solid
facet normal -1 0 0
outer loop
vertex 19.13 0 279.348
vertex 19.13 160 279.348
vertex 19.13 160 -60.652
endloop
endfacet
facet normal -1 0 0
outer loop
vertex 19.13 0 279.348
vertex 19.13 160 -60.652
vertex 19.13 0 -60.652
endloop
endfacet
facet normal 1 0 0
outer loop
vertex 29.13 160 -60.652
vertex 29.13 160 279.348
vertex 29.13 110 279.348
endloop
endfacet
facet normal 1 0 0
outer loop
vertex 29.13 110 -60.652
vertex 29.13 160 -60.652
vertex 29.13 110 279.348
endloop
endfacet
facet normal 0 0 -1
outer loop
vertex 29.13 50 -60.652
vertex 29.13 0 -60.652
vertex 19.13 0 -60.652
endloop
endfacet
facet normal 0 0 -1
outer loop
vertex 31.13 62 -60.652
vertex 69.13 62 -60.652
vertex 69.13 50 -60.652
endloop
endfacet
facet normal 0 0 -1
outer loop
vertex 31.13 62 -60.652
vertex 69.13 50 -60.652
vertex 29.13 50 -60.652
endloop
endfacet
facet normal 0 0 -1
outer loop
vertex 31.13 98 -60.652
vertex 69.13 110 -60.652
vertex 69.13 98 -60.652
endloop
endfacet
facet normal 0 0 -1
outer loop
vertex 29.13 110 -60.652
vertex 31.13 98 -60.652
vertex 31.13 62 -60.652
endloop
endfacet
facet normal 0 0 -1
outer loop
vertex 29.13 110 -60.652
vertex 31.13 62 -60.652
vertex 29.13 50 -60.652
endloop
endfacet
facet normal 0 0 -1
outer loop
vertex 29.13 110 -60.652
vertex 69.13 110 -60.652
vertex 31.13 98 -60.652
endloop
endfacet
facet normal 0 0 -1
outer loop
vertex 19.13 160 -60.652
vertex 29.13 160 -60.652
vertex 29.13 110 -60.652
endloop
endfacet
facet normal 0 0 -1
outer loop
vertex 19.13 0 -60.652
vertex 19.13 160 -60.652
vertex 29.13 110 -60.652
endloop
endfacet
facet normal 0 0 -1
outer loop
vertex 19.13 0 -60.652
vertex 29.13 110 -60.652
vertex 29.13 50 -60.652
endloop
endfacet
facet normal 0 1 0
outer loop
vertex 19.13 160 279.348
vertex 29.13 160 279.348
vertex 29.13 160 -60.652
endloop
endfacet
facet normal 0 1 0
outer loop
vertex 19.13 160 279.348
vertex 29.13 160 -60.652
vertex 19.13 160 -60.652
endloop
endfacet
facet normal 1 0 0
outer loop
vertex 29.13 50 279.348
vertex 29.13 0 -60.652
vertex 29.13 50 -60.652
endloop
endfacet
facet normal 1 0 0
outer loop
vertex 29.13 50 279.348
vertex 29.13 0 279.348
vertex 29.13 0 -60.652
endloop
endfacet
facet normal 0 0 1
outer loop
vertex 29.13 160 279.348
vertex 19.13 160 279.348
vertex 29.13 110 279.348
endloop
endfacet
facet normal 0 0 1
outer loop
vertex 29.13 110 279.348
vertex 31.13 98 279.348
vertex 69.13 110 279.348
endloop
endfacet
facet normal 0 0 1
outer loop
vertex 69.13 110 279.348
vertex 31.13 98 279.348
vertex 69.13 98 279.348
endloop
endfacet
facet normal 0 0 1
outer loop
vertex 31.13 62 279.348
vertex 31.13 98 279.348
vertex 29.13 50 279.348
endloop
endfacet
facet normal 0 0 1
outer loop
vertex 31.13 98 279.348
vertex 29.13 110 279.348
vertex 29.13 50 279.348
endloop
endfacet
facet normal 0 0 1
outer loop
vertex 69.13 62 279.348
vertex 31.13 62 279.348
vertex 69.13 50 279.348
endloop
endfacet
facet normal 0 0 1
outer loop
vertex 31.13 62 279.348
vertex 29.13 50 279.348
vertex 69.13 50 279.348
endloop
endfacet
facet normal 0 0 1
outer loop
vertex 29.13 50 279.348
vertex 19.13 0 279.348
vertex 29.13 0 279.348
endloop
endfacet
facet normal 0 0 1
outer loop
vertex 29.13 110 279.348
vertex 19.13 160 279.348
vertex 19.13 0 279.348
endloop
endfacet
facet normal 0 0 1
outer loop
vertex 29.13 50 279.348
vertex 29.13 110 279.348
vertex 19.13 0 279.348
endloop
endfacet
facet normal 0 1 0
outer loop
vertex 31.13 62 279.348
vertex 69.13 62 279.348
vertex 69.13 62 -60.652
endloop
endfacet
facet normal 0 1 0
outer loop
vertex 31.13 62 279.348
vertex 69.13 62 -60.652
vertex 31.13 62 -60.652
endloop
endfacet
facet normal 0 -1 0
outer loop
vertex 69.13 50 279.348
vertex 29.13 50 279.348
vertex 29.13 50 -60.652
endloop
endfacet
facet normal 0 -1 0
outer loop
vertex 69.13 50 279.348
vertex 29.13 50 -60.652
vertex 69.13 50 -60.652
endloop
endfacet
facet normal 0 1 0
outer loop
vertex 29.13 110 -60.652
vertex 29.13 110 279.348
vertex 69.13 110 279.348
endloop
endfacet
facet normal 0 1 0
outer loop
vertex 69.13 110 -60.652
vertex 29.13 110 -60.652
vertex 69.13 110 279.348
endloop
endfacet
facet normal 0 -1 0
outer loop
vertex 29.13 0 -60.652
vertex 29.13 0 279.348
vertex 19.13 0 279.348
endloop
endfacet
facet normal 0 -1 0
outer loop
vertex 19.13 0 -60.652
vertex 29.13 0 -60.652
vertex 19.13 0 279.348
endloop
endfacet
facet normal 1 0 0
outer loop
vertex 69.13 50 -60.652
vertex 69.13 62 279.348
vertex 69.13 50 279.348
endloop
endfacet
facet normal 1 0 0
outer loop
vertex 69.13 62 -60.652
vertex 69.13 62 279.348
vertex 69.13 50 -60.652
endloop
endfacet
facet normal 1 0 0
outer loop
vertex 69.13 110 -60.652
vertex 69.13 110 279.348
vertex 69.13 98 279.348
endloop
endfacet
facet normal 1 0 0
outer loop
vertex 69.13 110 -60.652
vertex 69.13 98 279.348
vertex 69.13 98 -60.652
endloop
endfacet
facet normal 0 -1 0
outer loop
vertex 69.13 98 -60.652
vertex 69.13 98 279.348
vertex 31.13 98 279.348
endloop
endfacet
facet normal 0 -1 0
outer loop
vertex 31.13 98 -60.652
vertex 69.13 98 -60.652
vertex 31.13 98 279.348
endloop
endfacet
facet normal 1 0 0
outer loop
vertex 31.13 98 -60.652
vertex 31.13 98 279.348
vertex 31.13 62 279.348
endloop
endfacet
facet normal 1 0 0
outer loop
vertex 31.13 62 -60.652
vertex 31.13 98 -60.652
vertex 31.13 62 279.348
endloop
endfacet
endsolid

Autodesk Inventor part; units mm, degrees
ref_plane "YZ Plane" through (0, 0, 0) normal (1, 0, 0) x (0, 1, 0)
ref_plane "XZ Plane" through (0, 0, 0) normal (0, 1, 0) x (-1, 0, 0)
ref_plane "XY Plane" through (0, 0, 0) normal (0, 0, 1) x (1, 0, 0)
sketch "Sketch1" plane through (0, 0, 0) normal (0, 1, 0) x (-1, 0, 0)
  line L0 (0, 279.3478) -> (-39.1304, 279.3478)
  line L1 (-39.1304, 279.3478) -> (-39.1304, -195.6522)
  line L2 (-39.1304, -195.6522) -> (0, -195.6522)
  line L3 (0, -195.6522) -> (0, 279.3478)
  line L4 (-39.1304, 279.3478) -> (-29.1304, 279.3478)
  line L5 (-29.1304, 254.3478) -> (-39.1304, 254.3478)
  line L6 (-39.1304, 254.3478) -> (-39.1304, 279.3478)
  line L7 (-39.1304, -195.6522) -> (-29.1304, -195.6522)
  line L8 (-29.1304, -170.6522) -> (-39.1304, -170.6522)
  line L9 (-39.1304, -170.6522) -> (-39.1304, -195.6522)
  point P0 (0, 0)
  point P1 (-39.1304, 254.3478)
  dimension "d0" = 475
  dimension "d4" = 25
  dimension "d5" = 25
extrude "Extrusion1" add sketch "Sketch1" along normal blind 160
sketch "Sketch2" plane through (0, 0, 279.3478) normal (0, 0, 1) x (1, 0, 0)
  line L0 (0, 160) -> (39.1304, 160) projected
  line L1 (0, 160) -> (39.1304, 160)
  line L2 (39.1304, 160) -> (39.1304, 0)
  line L3 (39.1304, 0) -> (0, 0)
  line L4 (0, 0) -> (0, 160)
  line L5 (39.1304, 160) -> (29.1304, 160)
  line L6 (29.1304, 160) -> (29.1304, 110)
  line L7 (29.1304, 110) -> (39.1304, 110)
  line L8 (39.1304, 110) -> (39.1304, 160)
  line L9 (39.1304, 0) -> (29.1304, 0)
  line L10 (29.1304, 0) -> (29.1304, 50)
  line L11 (29.1304, 50) -> (39.1304, 50)
  line L12 (39.1304, 50) -> (39.1304, 0)
  circle A0 centre (39.1304, 80) radius 18
  line L13 (31.1304, 75) -> (39.1304, 75)
  line L14 (39.1304, 75) -> (39.1304, 98)
  line L15 (39.1304, 98) -> (31.1304, 98)
  line L16 (31.1304, 98) -> (31.1304, 75)
  line L17 (31.1304, 75) -> (39.1304, 75)
  line L18 (39.1304, 75) -> (39.1304, 62)
  line L19 (39.1304, 62) -> (31.1304, 62)
  line L20 (31.1304, 62) -> (31.1304, 75)
  line L21 (39.1304, 0) -> (39.1304, 160) projected
  line L22 (0, 160) -> (19.1304, 160)
  line L23 (19.1304, 160) -> (19.1304, 0)
  line L24 (19.1304, 0) -> (0, 0)
  line L25 (0, 0) -> (0, 160)
  point P0 (0, 0)
  point P1 (34.1304, 110)
  point P2 (34.1304, 160)
  point P3 (39.1304, 50)
  point P4 (39.1304, 110)
  dimension "d6" = 10
  dimension "d7" = 50
  dimension "d8" = 50
  dimension "d9" = 8
  dimension "d10" = 36
  dimension "d11" = 80
  dimension "d12" = 80
  dimension "d15" = 20
extrude "Extrusion2" cut sketch "Sketch2" against normal up to surface (475 mm away) contours L0 L23 L3 L4 | L0 L2 L7 L6 | L10 L11 L2 L3 | L2 L13 L16 A0 | A0 L16 L15 | L2 A0 L20 L13 | L19 L20 A0
sketch "Sketch3" plane through (0, 160, 0) normal (0, 1, 0) x (1, 0, 0)
  line L0 (-18, 219) -> (160, 219)
  line L1 (160, 219) -> (160, 60.6522)
  line L2 (160, 60.6522) -> (-18, 60.6522)
  line L3 (-18, 60.6522) -> (-18, 219)
  line L4 (19.1304, -279.3478) -> (29.1304, -279.3478) projected
  point P0 (0, 0)
  dimension "d16" = 340
extrude "Extrusion3" cut sketch "Sketch3" against normal blind 200
sketch "Sketch4" plane through (39.1304, 98, 279.3478) normal (1, 0, 0) x (0, 0, -1)
  line L0 (340, 0) -> (340, 12) projected
  line L1 (340, 12) -> (0, 12) projected
  line L2 (0, 0) -> (0, 12) projected
  line L3 (0, 0) -> (340, 0) projected
  line L4 (340, -48) -> (340, -36) projected
  line L5 (340, -36) -> (0, -36) projected
  line L6 (0, -48) -> (0, -36) projected
  line L7 (0, -48) -> (340, -48) projected
  point P0 (279.3478, -98)
extrude "Extrusion4" add sketch "Sketch4" along normal blind 30
properties part number "MainRails" material "Aluminum 6061"
